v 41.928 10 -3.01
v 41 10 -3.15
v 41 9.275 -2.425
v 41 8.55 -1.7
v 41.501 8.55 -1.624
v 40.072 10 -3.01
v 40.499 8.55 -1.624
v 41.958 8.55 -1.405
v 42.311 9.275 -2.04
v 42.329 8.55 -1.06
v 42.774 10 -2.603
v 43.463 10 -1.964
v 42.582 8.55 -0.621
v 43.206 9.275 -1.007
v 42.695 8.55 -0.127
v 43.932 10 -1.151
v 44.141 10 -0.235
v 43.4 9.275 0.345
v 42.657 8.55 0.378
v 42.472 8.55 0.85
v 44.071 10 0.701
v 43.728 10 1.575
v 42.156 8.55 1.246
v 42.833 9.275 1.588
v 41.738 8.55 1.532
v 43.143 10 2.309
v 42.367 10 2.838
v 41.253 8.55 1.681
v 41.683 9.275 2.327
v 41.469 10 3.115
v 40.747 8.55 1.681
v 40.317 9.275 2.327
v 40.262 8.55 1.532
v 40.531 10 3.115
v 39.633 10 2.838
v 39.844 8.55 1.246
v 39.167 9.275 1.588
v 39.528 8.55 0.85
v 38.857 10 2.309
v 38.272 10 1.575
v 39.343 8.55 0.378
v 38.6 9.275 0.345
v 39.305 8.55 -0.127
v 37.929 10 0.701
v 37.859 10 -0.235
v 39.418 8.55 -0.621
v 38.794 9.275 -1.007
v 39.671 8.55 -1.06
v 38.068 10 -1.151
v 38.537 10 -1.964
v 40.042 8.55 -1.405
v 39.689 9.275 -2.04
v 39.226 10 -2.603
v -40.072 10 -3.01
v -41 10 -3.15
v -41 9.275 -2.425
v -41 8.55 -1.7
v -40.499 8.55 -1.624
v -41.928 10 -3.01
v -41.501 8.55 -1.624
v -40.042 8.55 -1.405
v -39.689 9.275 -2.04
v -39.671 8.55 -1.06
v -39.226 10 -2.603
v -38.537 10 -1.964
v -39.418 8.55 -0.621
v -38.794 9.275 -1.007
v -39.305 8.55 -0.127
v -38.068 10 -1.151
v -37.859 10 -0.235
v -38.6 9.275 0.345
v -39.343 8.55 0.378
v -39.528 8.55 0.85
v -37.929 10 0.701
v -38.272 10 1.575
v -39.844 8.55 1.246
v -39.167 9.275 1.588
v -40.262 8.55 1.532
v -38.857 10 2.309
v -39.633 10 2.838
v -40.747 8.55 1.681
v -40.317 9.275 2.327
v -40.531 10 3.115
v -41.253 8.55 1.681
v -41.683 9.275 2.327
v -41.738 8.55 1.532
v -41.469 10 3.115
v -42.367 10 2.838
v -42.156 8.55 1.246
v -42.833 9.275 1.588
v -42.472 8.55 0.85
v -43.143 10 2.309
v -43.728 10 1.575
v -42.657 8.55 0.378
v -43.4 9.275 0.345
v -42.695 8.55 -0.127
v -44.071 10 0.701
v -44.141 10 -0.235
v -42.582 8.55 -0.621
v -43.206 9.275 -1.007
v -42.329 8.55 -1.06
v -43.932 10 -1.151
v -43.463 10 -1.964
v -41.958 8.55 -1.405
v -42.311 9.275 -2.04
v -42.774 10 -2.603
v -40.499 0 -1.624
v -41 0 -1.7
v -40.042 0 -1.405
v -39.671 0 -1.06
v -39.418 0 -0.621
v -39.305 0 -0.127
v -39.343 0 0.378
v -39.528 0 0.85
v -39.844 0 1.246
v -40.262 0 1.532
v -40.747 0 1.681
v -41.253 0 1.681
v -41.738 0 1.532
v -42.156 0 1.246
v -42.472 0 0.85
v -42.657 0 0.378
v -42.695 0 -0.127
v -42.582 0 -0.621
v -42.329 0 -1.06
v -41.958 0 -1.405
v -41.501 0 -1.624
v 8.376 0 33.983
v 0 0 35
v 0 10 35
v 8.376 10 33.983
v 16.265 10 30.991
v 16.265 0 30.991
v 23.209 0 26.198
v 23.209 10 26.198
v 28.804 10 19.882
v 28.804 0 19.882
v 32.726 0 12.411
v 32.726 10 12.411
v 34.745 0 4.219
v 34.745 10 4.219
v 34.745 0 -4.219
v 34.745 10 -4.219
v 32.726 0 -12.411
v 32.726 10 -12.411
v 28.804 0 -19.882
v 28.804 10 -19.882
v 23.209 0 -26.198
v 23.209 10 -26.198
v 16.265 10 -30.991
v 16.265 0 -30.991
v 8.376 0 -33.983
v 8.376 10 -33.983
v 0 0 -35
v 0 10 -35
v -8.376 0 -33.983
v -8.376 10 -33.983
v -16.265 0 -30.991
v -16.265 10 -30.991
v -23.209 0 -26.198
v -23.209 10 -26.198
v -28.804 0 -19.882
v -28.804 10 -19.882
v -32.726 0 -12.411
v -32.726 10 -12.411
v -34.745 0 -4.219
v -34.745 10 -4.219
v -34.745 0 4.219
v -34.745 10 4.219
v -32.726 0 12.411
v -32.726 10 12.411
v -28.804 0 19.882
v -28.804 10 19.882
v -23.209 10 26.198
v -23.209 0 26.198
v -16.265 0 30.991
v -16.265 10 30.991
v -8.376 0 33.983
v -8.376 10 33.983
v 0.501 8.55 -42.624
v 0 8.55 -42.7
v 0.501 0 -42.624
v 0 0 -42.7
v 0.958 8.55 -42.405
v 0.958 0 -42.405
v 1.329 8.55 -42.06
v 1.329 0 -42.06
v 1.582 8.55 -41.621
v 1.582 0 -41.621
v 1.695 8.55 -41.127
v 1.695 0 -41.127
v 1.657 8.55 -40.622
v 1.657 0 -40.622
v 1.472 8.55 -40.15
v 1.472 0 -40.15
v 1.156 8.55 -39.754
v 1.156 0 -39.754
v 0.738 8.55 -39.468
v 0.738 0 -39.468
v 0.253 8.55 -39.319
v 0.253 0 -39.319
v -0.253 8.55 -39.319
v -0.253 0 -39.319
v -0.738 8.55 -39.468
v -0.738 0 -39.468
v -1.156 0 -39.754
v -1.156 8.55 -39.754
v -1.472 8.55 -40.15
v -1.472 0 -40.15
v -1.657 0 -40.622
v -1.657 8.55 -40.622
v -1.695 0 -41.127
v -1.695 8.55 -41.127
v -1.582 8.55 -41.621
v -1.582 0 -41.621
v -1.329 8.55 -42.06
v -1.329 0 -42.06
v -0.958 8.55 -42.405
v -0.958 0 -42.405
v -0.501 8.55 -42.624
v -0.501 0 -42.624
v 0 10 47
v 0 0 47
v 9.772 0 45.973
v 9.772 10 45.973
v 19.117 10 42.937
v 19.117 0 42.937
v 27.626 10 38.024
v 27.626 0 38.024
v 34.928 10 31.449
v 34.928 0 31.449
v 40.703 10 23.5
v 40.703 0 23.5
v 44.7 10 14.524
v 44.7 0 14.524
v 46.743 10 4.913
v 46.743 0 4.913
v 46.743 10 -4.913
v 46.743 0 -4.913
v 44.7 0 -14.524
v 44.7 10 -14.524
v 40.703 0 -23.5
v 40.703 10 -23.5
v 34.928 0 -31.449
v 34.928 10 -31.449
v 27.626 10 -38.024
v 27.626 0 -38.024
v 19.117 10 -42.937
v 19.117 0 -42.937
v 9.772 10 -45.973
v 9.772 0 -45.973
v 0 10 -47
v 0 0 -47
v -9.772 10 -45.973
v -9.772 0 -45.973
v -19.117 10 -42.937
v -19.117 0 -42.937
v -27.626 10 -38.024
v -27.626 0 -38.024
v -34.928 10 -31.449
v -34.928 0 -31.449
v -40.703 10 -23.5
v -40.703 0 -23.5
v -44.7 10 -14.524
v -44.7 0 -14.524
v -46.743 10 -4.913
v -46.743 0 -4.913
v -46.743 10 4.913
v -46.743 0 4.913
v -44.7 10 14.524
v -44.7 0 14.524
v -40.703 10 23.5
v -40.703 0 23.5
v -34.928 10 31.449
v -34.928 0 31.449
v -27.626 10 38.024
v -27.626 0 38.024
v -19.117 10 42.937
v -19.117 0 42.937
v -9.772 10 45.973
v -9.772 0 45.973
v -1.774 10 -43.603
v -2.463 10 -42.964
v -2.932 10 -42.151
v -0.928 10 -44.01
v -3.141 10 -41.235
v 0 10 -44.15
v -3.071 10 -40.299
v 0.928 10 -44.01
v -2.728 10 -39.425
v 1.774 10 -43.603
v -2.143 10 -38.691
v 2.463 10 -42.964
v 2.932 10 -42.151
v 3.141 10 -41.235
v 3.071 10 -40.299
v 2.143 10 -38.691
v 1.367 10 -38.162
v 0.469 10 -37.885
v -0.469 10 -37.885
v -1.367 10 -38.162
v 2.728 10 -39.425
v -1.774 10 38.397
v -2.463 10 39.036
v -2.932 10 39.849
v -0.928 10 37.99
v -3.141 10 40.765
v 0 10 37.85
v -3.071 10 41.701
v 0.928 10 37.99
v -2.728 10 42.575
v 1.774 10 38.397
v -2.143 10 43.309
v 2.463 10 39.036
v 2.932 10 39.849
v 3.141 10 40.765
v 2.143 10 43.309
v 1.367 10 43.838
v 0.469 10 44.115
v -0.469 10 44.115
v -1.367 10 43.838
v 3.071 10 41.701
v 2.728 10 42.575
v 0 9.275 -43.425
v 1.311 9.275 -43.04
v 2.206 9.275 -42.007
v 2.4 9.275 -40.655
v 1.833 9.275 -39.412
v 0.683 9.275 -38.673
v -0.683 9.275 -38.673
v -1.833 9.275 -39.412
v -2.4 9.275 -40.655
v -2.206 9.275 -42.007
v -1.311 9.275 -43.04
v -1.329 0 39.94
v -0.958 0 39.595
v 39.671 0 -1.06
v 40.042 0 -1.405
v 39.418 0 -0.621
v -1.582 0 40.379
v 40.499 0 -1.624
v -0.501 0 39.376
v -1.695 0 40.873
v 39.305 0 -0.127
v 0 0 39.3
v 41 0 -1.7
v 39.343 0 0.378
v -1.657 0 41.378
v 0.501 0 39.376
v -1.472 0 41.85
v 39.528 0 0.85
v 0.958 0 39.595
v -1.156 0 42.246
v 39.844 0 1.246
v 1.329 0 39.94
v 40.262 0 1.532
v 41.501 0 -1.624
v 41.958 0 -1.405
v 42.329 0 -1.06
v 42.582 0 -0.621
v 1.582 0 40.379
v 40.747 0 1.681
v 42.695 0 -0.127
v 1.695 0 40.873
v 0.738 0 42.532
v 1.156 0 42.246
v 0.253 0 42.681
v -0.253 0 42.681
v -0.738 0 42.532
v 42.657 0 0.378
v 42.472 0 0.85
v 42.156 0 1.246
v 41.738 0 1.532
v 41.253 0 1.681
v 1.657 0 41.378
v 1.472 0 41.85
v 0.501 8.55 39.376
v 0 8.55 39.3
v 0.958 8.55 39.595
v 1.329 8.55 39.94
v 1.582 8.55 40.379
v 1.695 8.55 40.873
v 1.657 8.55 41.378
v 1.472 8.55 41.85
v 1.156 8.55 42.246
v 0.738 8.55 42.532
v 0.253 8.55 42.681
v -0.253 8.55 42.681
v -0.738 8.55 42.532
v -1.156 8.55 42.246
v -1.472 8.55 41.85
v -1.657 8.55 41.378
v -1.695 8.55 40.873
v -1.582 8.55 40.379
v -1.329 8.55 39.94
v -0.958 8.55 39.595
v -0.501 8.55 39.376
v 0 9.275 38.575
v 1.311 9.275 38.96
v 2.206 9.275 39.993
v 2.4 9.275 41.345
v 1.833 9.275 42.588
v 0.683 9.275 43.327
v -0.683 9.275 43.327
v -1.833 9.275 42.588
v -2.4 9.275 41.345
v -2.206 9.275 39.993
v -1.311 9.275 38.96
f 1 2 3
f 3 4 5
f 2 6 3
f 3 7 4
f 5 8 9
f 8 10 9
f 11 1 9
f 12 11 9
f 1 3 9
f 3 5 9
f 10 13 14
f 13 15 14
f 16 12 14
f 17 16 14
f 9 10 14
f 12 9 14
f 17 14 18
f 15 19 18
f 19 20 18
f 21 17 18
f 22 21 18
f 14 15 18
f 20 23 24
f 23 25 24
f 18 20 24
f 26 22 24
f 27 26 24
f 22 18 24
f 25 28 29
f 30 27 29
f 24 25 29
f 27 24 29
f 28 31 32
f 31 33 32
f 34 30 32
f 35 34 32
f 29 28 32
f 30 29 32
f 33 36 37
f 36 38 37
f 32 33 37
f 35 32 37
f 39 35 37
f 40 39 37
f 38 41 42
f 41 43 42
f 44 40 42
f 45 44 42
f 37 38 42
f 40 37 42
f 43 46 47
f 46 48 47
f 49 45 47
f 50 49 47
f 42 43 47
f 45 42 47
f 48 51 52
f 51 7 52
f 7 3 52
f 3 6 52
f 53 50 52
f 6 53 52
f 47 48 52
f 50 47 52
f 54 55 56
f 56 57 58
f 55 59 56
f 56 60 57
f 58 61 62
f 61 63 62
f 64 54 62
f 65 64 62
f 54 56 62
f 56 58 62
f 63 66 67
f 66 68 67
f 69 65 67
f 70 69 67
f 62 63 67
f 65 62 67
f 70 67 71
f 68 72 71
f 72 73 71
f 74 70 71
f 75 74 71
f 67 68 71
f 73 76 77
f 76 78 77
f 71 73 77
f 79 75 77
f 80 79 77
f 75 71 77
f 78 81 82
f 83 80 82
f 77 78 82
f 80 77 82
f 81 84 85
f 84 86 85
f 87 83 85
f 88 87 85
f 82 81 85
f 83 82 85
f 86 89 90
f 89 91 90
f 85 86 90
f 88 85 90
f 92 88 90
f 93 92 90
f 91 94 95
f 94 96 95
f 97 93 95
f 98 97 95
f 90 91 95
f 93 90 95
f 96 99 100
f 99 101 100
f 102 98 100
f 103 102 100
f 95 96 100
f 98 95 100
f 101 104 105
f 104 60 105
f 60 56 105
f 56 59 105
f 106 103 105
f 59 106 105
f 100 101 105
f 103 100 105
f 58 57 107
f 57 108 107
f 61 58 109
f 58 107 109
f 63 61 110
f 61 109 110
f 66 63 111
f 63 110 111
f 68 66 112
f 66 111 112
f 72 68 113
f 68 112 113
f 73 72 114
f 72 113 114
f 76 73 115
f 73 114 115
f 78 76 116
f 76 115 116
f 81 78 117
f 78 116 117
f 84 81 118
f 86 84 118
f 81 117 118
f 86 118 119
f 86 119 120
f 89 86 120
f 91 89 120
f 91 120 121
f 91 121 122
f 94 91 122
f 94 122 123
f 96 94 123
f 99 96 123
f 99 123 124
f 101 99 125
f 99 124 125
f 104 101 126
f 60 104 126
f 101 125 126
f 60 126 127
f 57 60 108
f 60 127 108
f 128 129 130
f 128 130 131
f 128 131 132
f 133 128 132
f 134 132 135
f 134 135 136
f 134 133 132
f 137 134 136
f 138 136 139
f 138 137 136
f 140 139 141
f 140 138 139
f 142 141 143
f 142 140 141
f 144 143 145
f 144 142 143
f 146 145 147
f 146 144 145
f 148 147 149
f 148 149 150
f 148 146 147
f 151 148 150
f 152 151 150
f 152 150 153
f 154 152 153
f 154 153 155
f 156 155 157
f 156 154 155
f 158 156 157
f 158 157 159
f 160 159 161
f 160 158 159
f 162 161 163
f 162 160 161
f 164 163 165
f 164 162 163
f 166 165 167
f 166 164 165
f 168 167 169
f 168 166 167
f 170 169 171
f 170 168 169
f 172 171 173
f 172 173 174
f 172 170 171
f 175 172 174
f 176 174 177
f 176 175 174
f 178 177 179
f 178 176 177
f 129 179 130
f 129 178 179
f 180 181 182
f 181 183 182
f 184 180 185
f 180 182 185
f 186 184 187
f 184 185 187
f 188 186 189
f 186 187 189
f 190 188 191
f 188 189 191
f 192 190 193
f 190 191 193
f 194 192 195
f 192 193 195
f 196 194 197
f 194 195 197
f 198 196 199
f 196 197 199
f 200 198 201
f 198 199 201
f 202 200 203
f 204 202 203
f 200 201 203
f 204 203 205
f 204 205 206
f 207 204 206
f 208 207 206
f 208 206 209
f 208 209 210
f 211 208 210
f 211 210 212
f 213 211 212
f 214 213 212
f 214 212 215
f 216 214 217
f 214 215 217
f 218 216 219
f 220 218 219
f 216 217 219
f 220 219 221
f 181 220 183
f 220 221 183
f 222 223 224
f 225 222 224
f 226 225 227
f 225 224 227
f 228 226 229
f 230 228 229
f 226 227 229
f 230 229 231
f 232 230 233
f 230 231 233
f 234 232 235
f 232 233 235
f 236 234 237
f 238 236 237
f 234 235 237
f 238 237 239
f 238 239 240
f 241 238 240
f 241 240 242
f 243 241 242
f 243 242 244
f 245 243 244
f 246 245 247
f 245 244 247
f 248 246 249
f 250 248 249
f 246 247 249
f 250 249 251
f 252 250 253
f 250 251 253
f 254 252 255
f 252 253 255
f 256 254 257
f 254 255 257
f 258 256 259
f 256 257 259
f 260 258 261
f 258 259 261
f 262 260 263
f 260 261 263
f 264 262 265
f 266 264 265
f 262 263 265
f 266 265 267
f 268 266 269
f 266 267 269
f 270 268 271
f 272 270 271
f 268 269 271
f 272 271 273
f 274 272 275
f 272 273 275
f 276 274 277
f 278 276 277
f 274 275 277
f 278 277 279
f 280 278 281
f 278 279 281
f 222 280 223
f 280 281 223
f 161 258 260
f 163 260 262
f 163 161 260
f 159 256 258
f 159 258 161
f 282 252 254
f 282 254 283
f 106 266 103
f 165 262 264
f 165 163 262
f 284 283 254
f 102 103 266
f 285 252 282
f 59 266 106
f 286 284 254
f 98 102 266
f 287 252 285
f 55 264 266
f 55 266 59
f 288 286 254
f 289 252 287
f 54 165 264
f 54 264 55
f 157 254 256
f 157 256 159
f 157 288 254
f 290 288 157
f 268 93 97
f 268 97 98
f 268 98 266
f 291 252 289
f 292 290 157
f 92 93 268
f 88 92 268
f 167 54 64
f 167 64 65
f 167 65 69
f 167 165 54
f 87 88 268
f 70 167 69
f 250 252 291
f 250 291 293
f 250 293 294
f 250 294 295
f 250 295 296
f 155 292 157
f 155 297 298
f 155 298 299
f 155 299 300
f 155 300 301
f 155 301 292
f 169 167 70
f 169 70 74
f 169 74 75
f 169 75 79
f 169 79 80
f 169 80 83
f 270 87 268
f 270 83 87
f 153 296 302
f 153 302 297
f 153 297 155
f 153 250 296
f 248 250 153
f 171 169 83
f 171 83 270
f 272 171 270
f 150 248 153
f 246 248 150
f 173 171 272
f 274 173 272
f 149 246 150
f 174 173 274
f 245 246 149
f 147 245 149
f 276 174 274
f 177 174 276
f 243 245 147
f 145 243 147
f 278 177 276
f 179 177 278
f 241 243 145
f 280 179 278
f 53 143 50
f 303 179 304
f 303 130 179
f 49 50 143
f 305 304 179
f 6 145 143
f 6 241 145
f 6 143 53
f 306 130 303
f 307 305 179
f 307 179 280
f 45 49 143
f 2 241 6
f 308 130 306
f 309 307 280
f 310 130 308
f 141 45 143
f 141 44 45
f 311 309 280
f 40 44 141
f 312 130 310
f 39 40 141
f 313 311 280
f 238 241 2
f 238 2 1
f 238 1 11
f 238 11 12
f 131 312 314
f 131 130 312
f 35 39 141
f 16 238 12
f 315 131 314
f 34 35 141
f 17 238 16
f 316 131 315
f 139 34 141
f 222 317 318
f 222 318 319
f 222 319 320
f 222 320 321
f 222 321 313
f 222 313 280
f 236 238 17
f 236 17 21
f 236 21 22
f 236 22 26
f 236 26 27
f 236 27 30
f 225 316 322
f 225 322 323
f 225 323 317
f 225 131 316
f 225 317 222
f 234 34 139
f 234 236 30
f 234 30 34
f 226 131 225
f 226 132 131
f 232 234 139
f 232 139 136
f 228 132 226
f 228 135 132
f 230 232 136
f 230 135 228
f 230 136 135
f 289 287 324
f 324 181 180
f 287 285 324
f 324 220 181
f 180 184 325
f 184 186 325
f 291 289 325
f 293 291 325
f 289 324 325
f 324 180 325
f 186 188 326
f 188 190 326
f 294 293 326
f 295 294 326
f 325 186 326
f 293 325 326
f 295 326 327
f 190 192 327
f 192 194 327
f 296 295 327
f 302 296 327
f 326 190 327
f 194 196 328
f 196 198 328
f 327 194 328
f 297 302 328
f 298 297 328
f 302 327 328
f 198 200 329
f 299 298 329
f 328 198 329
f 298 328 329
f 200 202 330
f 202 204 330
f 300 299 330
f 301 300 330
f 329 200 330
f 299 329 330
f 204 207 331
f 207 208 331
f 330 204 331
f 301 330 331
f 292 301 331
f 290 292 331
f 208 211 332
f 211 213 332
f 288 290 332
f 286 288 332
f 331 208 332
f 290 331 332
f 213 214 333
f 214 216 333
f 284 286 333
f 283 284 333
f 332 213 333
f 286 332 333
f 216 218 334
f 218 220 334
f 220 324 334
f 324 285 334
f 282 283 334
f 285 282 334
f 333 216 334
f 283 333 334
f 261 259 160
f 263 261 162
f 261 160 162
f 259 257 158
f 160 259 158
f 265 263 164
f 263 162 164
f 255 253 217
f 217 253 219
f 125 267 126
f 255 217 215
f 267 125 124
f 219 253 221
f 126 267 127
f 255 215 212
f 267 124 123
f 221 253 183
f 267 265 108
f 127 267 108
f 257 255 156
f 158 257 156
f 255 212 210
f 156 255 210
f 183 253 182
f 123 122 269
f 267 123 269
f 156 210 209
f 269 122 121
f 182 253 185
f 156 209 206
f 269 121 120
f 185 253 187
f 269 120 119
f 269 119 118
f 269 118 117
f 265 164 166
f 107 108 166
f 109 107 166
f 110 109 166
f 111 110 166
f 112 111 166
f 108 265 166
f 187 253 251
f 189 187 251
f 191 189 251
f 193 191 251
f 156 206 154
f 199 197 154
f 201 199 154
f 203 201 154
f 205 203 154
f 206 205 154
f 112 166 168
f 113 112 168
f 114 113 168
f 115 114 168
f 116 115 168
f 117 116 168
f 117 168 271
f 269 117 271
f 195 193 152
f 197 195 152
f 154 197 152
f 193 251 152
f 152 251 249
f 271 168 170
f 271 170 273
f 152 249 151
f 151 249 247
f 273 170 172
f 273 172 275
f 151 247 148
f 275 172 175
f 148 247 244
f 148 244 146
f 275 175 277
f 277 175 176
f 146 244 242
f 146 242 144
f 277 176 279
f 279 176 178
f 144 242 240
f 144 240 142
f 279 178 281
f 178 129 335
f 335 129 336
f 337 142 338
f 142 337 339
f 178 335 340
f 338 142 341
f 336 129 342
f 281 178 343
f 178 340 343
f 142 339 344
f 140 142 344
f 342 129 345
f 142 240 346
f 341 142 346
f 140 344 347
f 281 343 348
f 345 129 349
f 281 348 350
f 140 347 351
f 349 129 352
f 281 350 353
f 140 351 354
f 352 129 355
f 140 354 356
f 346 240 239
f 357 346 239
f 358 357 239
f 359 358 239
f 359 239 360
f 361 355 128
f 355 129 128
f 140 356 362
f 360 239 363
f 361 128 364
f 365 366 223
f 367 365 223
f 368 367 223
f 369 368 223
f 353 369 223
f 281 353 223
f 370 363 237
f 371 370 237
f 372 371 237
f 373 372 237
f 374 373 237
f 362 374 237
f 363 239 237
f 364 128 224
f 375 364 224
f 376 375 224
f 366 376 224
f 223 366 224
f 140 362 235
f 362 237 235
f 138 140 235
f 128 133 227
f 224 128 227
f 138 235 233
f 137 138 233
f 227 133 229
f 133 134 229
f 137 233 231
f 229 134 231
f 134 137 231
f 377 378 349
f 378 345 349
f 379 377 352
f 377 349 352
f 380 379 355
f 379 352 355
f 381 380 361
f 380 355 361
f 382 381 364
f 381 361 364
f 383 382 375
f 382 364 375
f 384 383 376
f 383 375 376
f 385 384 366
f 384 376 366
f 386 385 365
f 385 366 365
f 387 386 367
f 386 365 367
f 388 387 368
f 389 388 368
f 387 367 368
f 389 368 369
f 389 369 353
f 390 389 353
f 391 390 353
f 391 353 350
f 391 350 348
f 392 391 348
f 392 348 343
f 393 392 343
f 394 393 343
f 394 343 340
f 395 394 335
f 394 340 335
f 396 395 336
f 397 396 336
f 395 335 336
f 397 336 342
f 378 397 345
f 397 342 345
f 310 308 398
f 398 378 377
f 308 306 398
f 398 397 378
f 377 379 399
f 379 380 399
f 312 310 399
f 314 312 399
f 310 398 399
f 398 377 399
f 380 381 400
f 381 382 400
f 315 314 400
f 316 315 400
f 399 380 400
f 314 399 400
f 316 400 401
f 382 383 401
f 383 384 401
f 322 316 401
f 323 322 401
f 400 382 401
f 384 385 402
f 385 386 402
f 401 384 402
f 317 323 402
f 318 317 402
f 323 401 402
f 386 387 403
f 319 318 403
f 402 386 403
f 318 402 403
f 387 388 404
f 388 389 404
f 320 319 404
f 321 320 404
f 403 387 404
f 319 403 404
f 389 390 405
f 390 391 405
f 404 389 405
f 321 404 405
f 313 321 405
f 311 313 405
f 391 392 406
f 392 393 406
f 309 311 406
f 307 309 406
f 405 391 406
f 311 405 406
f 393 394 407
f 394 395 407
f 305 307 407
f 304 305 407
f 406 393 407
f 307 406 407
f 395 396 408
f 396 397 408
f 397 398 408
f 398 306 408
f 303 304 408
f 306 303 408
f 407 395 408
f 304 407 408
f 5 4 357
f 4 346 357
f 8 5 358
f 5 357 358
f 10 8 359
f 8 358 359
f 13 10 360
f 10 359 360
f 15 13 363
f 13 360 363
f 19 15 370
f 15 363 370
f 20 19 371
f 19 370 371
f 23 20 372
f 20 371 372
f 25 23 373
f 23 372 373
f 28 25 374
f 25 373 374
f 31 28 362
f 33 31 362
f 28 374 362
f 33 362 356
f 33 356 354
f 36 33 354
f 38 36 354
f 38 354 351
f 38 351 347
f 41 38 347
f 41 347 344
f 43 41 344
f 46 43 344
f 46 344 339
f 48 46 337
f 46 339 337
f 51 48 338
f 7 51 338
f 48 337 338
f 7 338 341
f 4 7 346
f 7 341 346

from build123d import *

# Parameters (mm, degrees)
SCHIZZO1_R                             = 47
SCHIZZO1_R_2                           = 35
ESTRUSIONE_ESTRUSIONE1_DEPTH           = 10
FORO_SVASATO_PER_VITE_M3_1_D           = 3.4
FORO_SVASATO_PER_VITE_M3_1_DEPTH       = 188
FORO_SVASATO_PER_VITE_M3_1_CSINK_D     = 6.3
FORO_SVASATO_PER_VITE_M3_1_CSINK_ANGLE = 90
FORO_SVASATO_PER_VITE_M3_1_TIP         = 1.021463052


with BuildPart() as part:
    # Schizzo1 → Estrusione-Estrusione1 (new body)
    with BuildSketch(Plane(origin=(0, 0, 0), x_dir=(1, 0, 0), z_dir=(0, 1, 0))):
        with Locations(Location((0, 0, 0), (0, 0, 270))):
            Circle(SCHIZZO1_R)
        with Locations(Location((0, 0, 0), (0, 0, 270))):
            Circle(SCHIZZO1_R_2, mode=Mode.SUBTRACT)
    extrude(amount=ESTRUSIONE_ESTRUSIONE1_DEPTH)

    # Foro svasato per Vite M3-1
    with Locations(Plane(origin=(-41, 10, 0), x_dir=(0, 0, 1), z_dir=(0, 1, 0))):
        with Locations((0, 0), (0, 82), (41, 41), (-41, 41)):
            CounterSinkHole(FORO_SVASATO_PER_VITE_M3_1_D / 2, FORO_SVASATO_PER_VITE_M3_1_CSINK_D / 2, depth=FORO_SVASATO_PER_VITE_M3_1_DEPTH, counter_sink_angle=FORO_SVASATO_PER_VITE_M3_1_CSINK_ANGLE)
            with Locations((0, 0, -(FORO_SVASATO_PER_VITE_M3_1_DEPTH + FORO_SVASATO_PER_VITE_M3_1_TIP / 2))):  # 118° drill point
                Cone(0, FORO_SVASATO_PER_VITE_M3_1_D / 2, FORO_SVASATO_PER_VITE_M3_1_TIP, mode=Mode.SUBTRACT)


solid = part.part
